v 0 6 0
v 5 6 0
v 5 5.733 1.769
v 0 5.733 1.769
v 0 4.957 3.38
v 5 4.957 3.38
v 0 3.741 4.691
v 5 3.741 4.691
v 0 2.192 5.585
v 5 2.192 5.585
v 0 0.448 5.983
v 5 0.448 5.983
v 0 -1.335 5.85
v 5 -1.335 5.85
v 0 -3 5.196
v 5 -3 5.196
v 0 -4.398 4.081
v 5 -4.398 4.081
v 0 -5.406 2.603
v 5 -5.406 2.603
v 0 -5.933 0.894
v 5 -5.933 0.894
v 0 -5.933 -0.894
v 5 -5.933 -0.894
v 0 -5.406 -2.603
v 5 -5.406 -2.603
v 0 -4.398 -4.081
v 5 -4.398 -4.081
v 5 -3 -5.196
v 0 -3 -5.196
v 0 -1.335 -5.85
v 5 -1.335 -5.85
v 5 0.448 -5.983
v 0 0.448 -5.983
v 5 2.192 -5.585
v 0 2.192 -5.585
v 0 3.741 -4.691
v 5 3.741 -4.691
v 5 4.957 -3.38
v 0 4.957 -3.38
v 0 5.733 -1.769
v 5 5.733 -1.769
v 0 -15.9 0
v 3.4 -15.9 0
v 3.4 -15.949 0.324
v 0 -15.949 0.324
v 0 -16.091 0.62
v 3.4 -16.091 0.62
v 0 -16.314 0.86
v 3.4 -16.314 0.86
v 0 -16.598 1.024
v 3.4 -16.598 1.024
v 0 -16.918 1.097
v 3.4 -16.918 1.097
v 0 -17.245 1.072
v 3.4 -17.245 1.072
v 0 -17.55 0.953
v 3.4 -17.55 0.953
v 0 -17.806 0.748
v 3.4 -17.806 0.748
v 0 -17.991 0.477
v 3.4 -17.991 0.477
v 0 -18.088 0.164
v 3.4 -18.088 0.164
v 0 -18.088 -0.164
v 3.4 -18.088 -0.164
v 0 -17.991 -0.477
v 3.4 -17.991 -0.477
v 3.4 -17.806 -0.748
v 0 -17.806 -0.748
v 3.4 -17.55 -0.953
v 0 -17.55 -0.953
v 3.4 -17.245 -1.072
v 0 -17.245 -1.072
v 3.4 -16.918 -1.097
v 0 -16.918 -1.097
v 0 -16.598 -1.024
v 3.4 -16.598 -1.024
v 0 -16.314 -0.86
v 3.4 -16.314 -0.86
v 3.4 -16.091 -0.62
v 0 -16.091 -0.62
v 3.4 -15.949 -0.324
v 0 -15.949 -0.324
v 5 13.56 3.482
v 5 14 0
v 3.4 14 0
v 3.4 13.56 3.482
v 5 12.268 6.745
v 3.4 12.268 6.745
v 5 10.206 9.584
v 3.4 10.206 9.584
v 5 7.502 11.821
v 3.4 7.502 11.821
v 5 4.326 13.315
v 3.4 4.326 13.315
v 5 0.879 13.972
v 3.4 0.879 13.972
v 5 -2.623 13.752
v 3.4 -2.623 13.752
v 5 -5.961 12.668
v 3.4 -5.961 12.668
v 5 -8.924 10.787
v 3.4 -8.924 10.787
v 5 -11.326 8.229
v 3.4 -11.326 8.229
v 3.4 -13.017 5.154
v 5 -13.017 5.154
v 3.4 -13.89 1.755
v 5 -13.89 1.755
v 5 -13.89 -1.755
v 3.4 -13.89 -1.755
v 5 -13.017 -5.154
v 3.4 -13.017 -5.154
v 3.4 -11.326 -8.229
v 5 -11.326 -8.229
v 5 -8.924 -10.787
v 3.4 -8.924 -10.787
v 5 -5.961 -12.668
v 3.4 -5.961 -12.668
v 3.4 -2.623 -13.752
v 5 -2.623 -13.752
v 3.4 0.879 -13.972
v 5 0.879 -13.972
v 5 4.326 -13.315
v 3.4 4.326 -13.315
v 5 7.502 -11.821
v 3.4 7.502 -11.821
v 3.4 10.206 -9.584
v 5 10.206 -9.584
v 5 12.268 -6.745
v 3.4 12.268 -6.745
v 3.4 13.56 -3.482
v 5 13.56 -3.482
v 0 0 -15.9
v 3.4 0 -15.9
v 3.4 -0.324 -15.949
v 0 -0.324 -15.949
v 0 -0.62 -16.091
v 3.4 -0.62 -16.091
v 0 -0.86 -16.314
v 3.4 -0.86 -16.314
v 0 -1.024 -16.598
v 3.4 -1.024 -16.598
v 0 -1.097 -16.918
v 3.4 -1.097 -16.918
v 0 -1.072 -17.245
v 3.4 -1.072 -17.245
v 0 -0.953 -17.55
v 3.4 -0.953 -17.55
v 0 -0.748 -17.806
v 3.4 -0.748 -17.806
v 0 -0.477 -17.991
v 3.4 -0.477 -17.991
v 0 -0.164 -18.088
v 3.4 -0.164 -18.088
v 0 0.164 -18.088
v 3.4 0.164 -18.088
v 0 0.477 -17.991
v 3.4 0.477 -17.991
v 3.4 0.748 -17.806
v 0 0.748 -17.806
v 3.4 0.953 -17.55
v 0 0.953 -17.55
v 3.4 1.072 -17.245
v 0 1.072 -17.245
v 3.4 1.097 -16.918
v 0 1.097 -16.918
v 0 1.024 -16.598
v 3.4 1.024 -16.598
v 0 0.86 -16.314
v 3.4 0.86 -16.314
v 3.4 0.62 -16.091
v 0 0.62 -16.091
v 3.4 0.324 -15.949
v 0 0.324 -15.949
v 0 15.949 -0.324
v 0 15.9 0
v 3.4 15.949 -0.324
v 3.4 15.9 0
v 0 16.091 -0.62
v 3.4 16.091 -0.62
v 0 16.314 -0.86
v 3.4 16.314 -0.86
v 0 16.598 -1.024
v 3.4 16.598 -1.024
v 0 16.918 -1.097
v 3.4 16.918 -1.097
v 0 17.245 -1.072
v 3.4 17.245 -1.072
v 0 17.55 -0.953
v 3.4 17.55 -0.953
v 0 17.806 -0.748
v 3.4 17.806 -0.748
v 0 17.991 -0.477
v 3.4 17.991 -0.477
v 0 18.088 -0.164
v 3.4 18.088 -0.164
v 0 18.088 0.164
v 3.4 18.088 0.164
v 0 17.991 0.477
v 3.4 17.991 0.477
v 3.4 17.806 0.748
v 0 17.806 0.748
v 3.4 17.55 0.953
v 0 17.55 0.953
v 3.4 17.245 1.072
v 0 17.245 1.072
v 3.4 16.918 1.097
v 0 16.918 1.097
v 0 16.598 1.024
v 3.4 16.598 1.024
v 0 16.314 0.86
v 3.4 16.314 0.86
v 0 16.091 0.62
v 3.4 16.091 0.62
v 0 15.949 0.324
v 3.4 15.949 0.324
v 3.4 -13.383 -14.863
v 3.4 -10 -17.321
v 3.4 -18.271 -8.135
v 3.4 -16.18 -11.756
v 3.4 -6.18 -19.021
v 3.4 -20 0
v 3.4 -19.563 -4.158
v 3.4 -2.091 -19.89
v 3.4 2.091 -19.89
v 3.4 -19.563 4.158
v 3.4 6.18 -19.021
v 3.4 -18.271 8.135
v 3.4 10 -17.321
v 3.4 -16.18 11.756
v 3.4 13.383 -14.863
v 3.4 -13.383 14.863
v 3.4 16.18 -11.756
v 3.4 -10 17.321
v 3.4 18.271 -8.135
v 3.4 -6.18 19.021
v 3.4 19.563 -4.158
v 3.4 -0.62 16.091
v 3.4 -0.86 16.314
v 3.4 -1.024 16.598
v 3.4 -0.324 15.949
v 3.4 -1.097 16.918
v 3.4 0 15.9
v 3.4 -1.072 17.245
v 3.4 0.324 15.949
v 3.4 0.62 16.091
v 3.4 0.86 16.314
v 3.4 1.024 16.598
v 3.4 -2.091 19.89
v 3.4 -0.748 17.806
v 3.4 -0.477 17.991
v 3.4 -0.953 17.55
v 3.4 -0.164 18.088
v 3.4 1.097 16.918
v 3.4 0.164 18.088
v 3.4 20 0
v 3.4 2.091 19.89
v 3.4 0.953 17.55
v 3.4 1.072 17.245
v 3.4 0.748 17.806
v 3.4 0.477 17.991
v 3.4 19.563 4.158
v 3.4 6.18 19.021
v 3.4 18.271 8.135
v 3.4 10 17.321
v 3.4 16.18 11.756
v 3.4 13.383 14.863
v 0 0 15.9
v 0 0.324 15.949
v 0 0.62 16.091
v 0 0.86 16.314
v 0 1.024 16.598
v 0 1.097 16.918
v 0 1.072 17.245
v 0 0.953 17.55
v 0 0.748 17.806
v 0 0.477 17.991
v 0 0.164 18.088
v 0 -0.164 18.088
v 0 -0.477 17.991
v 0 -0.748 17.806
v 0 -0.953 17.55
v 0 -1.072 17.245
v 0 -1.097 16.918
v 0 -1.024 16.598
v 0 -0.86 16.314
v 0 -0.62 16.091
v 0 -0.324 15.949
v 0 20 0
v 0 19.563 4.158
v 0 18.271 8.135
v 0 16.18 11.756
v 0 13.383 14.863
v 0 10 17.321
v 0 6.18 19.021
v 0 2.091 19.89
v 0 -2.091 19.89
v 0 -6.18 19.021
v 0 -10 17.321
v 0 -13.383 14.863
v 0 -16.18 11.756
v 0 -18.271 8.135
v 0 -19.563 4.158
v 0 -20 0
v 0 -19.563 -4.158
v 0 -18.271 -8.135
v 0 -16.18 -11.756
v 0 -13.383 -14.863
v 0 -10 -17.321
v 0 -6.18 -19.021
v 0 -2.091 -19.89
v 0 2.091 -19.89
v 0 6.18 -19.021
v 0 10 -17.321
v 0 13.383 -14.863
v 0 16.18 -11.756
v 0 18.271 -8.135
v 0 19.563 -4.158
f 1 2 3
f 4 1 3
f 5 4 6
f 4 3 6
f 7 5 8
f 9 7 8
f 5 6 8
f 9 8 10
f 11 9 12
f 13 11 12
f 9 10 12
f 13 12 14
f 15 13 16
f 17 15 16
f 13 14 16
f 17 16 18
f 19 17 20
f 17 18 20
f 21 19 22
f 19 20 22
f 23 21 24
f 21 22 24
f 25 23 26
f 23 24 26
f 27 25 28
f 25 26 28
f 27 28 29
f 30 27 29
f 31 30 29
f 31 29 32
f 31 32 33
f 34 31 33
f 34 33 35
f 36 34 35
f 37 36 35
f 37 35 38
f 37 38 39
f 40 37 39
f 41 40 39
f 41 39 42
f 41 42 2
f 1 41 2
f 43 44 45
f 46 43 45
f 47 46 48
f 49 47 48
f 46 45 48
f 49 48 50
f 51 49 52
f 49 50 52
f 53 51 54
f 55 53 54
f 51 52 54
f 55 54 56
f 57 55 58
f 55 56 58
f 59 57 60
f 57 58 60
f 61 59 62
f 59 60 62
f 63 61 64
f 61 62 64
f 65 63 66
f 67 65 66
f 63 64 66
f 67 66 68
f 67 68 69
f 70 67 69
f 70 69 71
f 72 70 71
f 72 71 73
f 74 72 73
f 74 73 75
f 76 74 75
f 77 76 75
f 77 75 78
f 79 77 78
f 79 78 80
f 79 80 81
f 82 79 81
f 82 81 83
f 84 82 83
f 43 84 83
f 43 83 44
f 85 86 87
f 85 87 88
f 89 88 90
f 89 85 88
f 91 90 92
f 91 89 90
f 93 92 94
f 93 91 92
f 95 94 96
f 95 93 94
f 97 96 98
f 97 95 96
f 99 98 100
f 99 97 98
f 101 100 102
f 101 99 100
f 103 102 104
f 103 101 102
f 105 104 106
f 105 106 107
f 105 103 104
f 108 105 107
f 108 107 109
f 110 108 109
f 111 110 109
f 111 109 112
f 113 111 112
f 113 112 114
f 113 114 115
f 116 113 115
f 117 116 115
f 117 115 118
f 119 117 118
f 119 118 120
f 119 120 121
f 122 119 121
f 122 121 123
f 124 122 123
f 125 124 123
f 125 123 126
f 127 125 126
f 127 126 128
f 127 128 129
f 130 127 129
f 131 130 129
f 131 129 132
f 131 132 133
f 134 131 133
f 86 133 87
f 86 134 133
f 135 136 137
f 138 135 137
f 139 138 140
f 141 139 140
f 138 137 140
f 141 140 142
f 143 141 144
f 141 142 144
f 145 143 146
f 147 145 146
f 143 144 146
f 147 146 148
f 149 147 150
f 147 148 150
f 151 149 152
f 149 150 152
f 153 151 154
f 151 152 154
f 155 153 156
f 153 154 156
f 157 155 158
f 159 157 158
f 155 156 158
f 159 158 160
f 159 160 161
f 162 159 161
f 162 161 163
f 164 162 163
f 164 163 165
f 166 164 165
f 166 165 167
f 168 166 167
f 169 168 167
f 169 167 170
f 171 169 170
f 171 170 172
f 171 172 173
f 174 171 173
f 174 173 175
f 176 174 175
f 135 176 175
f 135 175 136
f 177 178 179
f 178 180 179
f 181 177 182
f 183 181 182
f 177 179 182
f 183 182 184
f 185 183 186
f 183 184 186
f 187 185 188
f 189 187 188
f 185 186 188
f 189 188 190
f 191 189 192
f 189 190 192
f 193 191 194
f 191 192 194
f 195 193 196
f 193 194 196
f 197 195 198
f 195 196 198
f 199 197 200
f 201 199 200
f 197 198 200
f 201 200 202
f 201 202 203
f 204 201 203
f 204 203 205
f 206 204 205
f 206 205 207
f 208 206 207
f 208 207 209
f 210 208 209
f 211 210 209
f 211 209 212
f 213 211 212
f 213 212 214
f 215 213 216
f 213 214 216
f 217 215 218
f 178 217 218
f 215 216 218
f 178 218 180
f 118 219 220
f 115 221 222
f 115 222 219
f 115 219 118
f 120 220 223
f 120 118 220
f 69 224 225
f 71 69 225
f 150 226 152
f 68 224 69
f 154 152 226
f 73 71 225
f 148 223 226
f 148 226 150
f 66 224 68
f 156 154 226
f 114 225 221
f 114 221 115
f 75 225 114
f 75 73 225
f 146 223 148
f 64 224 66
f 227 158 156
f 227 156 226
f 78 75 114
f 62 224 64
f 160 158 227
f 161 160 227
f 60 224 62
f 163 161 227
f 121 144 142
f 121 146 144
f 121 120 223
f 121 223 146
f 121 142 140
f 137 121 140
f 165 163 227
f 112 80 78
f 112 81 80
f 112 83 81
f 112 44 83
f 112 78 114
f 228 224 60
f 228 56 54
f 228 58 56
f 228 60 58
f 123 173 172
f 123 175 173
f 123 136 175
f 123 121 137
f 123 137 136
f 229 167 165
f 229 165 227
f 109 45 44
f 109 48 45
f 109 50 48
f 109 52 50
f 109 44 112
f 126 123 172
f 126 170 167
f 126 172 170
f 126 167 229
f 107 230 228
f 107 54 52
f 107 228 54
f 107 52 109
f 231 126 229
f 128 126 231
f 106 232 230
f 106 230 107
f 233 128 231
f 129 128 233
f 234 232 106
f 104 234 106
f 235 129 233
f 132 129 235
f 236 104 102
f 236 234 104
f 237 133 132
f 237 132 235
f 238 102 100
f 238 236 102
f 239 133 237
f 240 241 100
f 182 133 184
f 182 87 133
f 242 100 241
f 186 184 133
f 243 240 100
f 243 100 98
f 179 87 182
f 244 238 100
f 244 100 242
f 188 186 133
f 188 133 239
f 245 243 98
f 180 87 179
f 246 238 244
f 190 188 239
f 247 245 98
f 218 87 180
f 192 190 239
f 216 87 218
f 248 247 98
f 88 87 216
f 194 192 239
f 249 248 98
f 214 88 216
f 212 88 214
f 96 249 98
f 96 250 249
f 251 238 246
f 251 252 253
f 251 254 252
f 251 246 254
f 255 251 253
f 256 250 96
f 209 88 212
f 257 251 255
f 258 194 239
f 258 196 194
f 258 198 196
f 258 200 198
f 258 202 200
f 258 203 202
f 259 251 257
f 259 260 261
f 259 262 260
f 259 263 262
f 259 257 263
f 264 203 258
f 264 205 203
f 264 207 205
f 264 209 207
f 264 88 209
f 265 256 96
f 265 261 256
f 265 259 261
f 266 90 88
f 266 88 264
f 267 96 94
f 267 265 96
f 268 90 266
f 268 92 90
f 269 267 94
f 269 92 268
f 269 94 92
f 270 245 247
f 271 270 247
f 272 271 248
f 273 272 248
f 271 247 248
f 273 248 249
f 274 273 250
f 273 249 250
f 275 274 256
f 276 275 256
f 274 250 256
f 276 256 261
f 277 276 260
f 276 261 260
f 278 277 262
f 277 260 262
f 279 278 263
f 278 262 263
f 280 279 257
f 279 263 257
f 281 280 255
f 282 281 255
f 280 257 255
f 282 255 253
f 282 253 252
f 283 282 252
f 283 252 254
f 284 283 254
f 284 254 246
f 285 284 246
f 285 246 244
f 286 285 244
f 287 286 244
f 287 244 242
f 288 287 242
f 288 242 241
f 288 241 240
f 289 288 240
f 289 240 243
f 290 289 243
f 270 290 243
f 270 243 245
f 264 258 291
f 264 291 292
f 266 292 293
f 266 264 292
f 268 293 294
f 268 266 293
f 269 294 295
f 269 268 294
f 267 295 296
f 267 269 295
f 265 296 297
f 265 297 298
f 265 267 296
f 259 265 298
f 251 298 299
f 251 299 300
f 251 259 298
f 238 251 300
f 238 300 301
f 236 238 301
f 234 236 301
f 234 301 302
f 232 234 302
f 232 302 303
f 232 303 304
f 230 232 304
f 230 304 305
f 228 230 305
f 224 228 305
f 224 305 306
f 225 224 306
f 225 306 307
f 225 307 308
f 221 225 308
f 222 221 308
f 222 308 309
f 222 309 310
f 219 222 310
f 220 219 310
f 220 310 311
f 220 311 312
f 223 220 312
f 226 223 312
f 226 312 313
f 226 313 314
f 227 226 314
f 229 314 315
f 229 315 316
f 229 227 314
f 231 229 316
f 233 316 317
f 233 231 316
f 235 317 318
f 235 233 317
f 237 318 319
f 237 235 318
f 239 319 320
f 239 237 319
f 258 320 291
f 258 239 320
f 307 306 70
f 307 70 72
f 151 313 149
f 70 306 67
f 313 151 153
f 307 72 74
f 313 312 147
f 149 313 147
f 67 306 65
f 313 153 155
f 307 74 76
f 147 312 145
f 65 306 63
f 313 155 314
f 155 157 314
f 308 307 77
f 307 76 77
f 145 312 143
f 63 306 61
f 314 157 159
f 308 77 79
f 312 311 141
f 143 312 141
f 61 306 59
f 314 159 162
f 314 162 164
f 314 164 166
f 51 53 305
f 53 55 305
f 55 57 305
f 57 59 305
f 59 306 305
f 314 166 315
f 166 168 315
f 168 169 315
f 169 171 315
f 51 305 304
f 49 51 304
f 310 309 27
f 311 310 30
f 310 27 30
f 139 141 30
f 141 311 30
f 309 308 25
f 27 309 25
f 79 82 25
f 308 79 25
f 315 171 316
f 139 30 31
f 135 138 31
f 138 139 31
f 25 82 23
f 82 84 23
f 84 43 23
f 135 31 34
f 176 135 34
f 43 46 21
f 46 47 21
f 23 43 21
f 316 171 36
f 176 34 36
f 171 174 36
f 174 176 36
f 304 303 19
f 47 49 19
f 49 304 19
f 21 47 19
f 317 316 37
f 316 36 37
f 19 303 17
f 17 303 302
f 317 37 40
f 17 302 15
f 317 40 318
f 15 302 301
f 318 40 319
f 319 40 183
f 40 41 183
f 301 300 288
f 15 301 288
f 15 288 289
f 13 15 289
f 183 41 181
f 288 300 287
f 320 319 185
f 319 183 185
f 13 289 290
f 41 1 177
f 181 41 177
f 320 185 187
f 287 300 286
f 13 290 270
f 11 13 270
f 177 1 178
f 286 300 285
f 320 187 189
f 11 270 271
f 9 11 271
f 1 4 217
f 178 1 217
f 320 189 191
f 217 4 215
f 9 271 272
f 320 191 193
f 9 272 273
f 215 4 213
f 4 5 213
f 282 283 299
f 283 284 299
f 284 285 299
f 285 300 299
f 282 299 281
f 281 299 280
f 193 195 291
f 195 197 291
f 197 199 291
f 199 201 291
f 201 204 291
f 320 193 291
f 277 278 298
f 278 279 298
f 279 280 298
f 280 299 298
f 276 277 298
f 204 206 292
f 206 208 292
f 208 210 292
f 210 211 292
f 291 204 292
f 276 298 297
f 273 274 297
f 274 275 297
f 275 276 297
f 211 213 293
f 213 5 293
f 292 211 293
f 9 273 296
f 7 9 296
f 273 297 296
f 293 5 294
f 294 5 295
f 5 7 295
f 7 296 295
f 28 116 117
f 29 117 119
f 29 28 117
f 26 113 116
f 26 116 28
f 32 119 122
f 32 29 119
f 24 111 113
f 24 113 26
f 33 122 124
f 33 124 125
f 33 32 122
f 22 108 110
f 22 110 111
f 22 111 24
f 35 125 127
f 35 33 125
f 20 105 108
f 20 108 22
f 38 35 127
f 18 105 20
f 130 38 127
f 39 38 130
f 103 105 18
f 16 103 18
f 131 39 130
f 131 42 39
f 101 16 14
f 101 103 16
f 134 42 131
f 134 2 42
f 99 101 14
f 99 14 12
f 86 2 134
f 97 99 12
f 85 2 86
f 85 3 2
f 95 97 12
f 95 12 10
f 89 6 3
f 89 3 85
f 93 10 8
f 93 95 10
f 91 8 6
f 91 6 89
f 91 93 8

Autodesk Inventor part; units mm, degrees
ref_plane "YZ Plane" through (0, 0, 0) normal (1, 0, 0) x (0, 1, 0)
ref_plane "XZ Plane" through (0, 0, 0) normal (0, 1, 0) x (-1, 0, 0)
ref_plane "XY Plane" through (0, 0, 0) normal (0, 0, 1) x (1, 0, 0)
sketch "Sketch1" plane through (0, 0, 0) normal (0, 0, 1) x (1, 0, 0)
  line L0 (-11.0022, 0) -> (11.0022, 0) construction
  line L1 (0, 10.3849) -> (0, -10.3849) construction
  line L2 (0, 0) -> (0, 20)
  line L3 (0, 20) -> (3.4, 20)
  line L4 (3.4, 20) -> (3.4, 14)
  line L5 (3.4, 14) -> (5, 14)
  line L6 (5, 14) -> (5, 0)
  line L7 (5, 0) -> (0, 0)
  line L8 (0, 6) -> (5, 6)
  dimension "d0" = 40
  dimension "d1" = 28
  dimension "d2" = 1.6
  dimension "d4" = 12
  dimension "d17" = 5
revolve "Revolution1" add sketch "Sketch1" angle 360 about axis through (-11.0022, 0, 0) along (1, 0, 0) contours L2 L3 L4 L5 L6 L8
sketch "Sketch2" plane through (0, 0, 0) normal (-1, 0, 0) x (0, 0, 1)
  circle A0 centre (0, 0) radius 17 construction
  line L0 (0, 0) -> (-21.4597, 0) construction
  point P0 (-17, 0)
  dimension "d6" = 34
hole "Hole1" at (0, 0, -17) direction (1, 0, 0) diameter 2.2 depth 8 tip angle 118
pattern_circular "Circular Pattern1" count 4 over 360 about axis through (2.5, 0, 0) along (1, 0, 0) of "Hole1"
properties part number "P04" material "Aluminium"
